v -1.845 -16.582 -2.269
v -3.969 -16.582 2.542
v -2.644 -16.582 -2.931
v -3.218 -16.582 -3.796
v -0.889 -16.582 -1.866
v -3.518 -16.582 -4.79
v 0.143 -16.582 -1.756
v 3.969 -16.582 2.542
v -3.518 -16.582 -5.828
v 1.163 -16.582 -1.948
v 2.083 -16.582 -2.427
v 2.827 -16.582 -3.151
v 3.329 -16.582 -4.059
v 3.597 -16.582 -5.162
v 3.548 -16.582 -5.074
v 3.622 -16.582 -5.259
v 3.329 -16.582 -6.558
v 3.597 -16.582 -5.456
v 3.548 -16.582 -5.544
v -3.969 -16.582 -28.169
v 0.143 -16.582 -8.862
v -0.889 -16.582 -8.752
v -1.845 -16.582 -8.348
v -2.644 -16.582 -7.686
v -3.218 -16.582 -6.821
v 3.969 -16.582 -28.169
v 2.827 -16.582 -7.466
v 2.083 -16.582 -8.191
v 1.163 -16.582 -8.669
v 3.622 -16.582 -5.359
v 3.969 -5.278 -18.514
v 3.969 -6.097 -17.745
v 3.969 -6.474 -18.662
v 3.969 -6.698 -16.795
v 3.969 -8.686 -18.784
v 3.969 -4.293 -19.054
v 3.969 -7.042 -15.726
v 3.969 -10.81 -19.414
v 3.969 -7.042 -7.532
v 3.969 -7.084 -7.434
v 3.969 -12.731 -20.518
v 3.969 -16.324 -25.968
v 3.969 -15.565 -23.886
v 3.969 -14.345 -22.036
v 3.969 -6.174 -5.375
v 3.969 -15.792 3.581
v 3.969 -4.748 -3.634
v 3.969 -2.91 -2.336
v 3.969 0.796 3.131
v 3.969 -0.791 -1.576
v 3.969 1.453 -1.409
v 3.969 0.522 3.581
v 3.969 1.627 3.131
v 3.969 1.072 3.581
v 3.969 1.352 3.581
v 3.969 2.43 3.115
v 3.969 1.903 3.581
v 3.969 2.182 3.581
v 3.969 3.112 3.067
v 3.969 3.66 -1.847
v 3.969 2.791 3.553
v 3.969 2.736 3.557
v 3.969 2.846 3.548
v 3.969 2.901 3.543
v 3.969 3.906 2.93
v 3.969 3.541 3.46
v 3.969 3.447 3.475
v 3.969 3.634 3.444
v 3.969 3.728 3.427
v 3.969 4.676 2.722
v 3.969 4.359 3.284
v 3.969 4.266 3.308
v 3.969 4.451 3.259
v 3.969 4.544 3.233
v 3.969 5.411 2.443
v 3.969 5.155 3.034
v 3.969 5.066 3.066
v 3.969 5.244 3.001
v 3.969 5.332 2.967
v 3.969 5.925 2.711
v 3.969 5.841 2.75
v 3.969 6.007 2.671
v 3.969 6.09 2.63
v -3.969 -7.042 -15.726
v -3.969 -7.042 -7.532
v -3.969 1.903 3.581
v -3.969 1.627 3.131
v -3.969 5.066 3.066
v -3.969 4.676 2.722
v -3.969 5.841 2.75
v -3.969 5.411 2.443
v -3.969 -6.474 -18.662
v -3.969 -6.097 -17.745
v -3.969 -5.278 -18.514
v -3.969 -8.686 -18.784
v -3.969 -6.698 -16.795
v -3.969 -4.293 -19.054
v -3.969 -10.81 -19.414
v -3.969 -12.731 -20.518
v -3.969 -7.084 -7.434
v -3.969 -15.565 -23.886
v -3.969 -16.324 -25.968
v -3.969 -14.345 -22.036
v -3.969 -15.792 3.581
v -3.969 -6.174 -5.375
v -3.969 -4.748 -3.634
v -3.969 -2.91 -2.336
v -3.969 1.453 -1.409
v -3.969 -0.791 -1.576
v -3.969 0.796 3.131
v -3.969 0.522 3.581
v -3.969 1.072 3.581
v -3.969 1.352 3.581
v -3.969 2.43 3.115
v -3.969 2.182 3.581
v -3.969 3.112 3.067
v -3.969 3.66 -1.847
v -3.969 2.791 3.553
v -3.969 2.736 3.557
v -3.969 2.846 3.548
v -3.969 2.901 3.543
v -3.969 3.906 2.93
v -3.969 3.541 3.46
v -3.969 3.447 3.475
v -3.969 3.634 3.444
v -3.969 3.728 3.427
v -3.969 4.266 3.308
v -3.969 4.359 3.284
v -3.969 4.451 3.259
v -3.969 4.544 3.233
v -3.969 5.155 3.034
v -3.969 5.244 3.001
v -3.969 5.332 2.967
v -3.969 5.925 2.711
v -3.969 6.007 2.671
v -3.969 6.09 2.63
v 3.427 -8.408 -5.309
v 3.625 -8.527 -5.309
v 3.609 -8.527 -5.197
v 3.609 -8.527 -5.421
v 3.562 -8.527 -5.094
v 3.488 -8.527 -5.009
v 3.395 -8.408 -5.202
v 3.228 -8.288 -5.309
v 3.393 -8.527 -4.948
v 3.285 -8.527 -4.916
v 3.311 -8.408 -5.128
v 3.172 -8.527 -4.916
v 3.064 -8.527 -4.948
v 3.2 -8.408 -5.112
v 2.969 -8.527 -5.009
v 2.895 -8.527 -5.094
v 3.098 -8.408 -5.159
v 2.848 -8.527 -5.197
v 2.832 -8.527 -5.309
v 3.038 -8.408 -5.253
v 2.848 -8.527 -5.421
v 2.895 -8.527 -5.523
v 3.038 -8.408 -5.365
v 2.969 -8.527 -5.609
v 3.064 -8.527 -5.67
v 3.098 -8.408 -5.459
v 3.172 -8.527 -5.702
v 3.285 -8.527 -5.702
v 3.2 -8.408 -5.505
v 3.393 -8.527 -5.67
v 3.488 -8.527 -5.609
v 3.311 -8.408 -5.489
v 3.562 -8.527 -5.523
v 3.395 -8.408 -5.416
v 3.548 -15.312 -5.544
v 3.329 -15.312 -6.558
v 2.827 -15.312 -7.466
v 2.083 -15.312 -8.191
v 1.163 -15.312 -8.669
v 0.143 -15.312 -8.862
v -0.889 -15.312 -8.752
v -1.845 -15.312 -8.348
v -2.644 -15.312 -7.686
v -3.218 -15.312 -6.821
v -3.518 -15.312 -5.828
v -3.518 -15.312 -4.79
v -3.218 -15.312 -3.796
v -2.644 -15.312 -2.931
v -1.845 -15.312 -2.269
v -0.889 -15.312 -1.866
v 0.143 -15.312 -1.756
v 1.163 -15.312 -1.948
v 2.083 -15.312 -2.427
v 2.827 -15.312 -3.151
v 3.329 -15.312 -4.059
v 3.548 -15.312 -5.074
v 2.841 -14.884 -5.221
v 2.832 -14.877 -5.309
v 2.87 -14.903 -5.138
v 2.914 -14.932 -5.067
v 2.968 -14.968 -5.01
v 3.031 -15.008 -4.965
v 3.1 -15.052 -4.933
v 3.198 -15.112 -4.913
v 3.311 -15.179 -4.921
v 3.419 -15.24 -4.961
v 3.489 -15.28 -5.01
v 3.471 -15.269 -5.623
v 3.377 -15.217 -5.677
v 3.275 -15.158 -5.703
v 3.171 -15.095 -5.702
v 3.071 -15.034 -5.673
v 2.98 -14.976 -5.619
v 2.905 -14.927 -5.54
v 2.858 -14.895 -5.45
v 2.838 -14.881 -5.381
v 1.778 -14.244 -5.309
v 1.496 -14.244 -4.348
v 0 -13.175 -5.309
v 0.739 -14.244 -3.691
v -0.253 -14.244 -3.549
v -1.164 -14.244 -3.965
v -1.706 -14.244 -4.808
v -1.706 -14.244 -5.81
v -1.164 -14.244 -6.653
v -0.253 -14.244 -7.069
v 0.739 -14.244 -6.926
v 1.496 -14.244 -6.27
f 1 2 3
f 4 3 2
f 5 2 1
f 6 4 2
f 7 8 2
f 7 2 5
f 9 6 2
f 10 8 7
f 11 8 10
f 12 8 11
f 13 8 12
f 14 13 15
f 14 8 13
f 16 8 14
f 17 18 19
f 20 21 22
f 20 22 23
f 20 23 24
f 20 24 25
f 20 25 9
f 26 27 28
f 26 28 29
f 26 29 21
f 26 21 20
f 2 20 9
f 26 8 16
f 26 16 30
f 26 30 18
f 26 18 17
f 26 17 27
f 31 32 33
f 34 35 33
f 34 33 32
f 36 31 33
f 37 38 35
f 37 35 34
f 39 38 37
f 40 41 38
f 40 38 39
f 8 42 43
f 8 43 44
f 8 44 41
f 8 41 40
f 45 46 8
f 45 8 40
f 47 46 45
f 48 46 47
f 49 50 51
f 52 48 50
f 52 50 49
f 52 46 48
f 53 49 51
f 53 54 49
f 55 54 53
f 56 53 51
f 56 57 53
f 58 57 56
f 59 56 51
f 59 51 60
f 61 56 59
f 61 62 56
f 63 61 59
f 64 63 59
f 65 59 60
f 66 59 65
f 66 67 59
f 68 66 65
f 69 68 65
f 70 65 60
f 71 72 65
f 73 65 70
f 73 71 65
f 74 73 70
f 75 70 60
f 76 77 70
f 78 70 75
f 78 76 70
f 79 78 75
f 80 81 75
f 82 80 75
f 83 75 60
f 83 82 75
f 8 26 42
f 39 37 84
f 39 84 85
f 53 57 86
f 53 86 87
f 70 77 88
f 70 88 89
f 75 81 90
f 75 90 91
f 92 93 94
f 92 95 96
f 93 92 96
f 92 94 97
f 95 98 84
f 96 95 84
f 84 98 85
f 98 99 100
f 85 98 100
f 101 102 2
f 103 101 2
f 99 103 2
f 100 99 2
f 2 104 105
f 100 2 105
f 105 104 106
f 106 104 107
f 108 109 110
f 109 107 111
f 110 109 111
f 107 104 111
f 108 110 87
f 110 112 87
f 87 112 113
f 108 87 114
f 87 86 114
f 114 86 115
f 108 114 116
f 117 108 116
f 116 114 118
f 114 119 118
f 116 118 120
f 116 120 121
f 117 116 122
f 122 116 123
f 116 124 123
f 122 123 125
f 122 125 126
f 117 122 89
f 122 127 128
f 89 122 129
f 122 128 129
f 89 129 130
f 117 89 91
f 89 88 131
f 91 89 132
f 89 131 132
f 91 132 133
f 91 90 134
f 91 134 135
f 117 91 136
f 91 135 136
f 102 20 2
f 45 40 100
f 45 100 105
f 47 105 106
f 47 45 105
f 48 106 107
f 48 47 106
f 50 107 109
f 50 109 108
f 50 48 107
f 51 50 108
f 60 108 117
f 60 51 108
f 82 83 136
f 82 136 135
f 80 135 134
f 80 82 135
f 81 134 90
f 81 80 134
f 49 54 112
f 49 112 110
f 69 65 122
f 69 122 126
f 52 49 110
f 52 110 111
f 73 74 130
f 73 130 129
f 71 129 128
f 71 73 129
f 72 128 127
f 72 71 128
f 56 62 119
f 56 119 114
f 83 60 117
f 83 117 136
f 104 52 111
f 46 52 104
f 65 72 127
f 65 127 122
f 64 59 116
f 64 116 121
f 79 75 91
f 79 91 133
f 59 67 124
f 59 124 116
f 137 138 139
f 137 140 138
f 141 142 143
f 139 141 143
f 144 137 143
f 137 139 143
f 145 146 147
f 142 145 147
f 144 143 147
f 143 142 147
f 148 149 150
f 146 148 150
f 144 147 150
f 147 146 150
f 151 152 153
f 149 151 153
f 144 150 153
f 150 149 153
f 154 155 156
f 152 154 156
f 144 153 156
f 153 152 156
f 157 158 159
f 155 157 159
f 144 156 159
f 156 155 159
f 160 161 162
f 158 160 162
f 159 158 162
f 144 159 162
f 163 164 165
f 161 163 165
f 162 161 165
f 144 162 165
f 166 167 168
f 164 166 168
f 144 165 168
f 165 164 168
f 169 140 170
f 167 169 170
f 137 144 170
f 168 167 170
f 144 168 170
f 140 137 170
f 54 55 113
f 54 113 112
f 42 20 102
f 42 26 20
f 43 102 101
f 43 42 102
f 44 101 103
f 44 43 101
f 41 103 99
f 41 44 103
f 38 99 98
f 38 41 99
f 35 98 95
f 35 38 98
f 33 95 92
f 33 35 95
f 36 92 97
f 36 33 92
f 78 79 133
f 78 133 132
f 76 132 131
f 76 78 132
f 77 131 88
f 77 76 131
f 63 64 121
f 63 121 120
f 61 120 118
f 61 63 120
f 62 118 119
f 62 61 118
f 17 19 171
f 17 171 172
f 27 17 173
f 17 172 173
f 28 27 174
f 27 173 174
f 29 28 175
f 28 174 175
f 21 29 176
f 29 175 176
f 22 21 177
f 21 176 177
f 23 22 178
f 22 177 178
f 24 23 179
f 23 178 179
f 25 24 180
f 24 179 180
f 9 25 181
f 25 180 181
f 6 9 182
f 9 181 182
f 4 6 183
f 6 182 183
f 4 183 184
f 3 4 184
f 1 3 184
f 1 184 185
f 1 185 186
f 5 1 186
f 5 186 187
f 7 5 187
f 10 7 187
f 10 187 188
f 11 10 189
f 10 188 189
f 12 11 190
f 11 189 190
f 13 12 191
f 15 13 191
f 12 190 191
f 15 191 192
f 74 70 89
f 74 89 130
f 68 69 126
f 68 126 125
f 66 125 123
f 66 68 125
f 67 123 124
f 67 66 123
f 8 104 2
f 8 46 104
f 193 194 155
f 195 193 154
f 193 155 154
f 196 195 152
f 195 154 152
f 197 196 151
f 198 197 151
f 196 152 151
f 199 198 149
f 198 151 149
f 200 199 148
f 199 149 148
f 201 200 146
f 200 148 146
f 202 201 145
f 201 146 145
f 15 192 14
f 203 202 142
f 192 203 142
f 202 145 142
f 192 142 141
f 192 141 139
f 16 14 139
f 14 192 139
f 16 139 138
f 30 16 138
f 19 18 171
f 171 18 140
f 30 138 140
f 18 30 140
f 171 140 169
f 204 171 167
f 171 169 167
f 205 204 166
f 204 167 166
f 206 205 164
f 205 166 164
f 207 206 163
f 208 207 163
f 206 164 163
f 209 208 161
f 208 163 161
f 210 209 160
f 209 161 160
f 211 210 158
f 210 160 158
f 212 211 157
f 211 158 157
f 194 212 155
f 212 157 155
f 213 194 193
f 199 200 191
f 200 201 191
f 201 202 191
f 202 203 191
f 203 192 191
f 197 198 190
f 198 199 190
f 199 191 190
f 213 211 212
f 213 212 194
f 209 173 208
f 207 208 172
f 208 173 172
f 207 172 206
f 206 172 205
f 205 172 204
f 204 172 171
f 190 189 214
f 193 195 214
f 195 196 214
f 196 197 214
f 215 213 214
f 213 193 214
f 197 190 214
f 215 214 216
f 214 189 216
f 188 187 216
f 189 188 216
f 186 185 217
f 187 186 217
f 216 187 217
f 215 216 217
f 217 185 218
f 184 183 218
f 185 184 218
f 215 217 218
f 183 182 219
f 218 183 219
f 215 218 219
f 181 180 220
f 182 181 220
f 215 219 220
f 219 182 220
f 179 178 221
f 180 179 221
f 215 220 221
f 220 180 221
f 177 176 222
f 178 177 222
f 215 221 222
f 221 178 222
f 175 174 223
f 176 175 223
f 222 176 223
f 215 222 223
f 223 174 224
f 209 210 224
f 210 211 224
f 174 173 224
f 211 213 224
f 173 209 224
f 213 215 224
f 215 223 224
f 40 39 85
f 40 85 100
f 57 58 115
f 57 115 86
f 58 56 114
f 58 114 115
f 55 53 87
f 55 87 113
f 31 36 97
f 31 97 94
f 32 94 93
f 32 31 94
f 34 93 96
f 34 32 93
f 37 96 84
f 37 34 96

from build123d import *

# Parameters (mm, degrees)
F1_DEPTH = 3.96875
F3_D     = 7.112
F3_DEPTH = 1.27
F3_TIP   = 2.1366603613
F4_D     = 0.79375
F4_DEPTH = 6.35
F4_START = 1.7053071
F4_TIP   = 0.2384665582


with BuildPart() as f1:
    # F0 (on Right) → F1 (new body, symmetric)
    with BuildSketch(Plane.YZ):
        with BuildLine():
            ThreePointArc((-16.5820843466, -28.1687893691), (-12.7313500896, -20.5184081186), (-4.2926705349, -19.0537665343))
            ThreePointArc((-4.2926705349, -19.0537665343), (-6.0968895961, -17.7448451986), (-7.0416428507, -15.7259537276))
            Line((-7.0416428507, -15.7259537276), (-7.0416428507, -7.5320968079))
            Line((-7.0416428507, -7.5320968079), (-7.0835554391, -7.4335314032))
            ThreePointArc((-7.0835554391, -7.4335314032), (-2.909546262, -2.3362589898), (3.6604483792, -1.846658048))
            Line((3.6604483792, -1.846658048), (6.0898731954, 2.6299539005))
            ThreePointArc((6.0898731954, 2.6299539005), (5.9660197938, 2.6908408891), (5.8412454606, 2.7498176323))
            Line((5.8412454606, 2.7498176323), (5.4112701147, 2.4430661607))
            Line((5.4112701147, 2.4430661607), (5.3323597714, 2.9668079517))
            ThreePointArc((5.3323597714, 2.9668079517), (5.1993250581, 3.0175413287), (5.0655028414, 3.0661594818))
            Line((5.0655028414, 3.0661594818), (4.6760486841, 2.7215427864))
            Line((4.6760486841, 2.7215427864), (4.5437401301, 3.2333209511))
            ThreePointArc((4.5437401301, 3.2333209511), (4.4049280258, 3.2719655055), (4.2655138361, 3.3083782172))
            Line((4.2655138361, 3.3083782172), (3.9063011974, 2.9300989368))
            Line((3.9063011974, 2.9300989368), (3.7280245356, 3.4267729314))
            ThreePointArc((3.7280245356, 3.4267729314), (3.587642111, 3.4520611622), (3.4468757875, 3.4751167886))
            Line((3.4468757875, 3.4751167886), (3.1119610132, 3.0673169038))
            Line((3.1119610132, 3.0673169038), (2.9009439477, 3.5430359177))
            ThreePointArc((2.9009439477, 3.5430359177), (2.8186697806, 3.5503399623), (2.7363319231, 3.5568870884))
            Line((2.7363319231, 3.5568870884), (2.4299388255, 3.115257909))
            Line((2.4299388255, 3.115257909), (2.1822380262, 3.5812106309))
            Line((2.1822380262, 3.5812106309), (1.9028896964, 3.5812106309))
            Line((1.9028896964, 3.5812106309), (1.6272033132, 3.1312487768))
            Line((1.6272033132, 3.1312487768), (1.3515187926, 3.5812106309))
            Line((1.3515187926, 3.5812106309), (1.0721187926, 3.5812106309))
            Line((1.0721187926, 3.5812106309), (0.7964324093, 3.1312487768))
            Line((0.7964324093, 3.1312487768), (0.5218389011, 3.5812106309))
            Line((0.5218389011, 3.5812106309), (-15.7920872965, 3.5812106309))
            Line((-15.7920872965, 3.5812106309), (-16.5820843466, 2.5423362134))
            Line((-16.5820843466, 2.5423362134), (-16.5820843466, -28.1687893691))
        make_face()
    extrude(amount=F1_DEPTH, both=True)

    # F3
    with Locations(Plane.XZ.offset(16.5820843466)):
        with Locations((0, -5.3087893691)):
            Hole(F3_D / 2, depth=F3_DEPTH)
            with Locations((0, 0, -(F3_DEPTH + F3_TIP / 2))):  # 118° drill point
                Cone(0, F3_D / 2, F3_TIP, mode=Mode.SUBTRACT)

    # F4
    # its depths count from where the whole tool has entered the part; down to there all is cleared
    with Locations(Plane.XZ.offset(16.5820843466).offset(-F4_START)):
        with Locations((3.2284024637, -5.3087893691)):
            Hole(F4_D / 2, depth=F4_DEPTH)
            with Locations((0, 0, -(F4_DEPTH + F4_TIP / 2))):  # 118° drill point
                Cone(0, F4_D / 2, F4_TIP, mode=Mode.SUBTRACT)


solid = f1.part
